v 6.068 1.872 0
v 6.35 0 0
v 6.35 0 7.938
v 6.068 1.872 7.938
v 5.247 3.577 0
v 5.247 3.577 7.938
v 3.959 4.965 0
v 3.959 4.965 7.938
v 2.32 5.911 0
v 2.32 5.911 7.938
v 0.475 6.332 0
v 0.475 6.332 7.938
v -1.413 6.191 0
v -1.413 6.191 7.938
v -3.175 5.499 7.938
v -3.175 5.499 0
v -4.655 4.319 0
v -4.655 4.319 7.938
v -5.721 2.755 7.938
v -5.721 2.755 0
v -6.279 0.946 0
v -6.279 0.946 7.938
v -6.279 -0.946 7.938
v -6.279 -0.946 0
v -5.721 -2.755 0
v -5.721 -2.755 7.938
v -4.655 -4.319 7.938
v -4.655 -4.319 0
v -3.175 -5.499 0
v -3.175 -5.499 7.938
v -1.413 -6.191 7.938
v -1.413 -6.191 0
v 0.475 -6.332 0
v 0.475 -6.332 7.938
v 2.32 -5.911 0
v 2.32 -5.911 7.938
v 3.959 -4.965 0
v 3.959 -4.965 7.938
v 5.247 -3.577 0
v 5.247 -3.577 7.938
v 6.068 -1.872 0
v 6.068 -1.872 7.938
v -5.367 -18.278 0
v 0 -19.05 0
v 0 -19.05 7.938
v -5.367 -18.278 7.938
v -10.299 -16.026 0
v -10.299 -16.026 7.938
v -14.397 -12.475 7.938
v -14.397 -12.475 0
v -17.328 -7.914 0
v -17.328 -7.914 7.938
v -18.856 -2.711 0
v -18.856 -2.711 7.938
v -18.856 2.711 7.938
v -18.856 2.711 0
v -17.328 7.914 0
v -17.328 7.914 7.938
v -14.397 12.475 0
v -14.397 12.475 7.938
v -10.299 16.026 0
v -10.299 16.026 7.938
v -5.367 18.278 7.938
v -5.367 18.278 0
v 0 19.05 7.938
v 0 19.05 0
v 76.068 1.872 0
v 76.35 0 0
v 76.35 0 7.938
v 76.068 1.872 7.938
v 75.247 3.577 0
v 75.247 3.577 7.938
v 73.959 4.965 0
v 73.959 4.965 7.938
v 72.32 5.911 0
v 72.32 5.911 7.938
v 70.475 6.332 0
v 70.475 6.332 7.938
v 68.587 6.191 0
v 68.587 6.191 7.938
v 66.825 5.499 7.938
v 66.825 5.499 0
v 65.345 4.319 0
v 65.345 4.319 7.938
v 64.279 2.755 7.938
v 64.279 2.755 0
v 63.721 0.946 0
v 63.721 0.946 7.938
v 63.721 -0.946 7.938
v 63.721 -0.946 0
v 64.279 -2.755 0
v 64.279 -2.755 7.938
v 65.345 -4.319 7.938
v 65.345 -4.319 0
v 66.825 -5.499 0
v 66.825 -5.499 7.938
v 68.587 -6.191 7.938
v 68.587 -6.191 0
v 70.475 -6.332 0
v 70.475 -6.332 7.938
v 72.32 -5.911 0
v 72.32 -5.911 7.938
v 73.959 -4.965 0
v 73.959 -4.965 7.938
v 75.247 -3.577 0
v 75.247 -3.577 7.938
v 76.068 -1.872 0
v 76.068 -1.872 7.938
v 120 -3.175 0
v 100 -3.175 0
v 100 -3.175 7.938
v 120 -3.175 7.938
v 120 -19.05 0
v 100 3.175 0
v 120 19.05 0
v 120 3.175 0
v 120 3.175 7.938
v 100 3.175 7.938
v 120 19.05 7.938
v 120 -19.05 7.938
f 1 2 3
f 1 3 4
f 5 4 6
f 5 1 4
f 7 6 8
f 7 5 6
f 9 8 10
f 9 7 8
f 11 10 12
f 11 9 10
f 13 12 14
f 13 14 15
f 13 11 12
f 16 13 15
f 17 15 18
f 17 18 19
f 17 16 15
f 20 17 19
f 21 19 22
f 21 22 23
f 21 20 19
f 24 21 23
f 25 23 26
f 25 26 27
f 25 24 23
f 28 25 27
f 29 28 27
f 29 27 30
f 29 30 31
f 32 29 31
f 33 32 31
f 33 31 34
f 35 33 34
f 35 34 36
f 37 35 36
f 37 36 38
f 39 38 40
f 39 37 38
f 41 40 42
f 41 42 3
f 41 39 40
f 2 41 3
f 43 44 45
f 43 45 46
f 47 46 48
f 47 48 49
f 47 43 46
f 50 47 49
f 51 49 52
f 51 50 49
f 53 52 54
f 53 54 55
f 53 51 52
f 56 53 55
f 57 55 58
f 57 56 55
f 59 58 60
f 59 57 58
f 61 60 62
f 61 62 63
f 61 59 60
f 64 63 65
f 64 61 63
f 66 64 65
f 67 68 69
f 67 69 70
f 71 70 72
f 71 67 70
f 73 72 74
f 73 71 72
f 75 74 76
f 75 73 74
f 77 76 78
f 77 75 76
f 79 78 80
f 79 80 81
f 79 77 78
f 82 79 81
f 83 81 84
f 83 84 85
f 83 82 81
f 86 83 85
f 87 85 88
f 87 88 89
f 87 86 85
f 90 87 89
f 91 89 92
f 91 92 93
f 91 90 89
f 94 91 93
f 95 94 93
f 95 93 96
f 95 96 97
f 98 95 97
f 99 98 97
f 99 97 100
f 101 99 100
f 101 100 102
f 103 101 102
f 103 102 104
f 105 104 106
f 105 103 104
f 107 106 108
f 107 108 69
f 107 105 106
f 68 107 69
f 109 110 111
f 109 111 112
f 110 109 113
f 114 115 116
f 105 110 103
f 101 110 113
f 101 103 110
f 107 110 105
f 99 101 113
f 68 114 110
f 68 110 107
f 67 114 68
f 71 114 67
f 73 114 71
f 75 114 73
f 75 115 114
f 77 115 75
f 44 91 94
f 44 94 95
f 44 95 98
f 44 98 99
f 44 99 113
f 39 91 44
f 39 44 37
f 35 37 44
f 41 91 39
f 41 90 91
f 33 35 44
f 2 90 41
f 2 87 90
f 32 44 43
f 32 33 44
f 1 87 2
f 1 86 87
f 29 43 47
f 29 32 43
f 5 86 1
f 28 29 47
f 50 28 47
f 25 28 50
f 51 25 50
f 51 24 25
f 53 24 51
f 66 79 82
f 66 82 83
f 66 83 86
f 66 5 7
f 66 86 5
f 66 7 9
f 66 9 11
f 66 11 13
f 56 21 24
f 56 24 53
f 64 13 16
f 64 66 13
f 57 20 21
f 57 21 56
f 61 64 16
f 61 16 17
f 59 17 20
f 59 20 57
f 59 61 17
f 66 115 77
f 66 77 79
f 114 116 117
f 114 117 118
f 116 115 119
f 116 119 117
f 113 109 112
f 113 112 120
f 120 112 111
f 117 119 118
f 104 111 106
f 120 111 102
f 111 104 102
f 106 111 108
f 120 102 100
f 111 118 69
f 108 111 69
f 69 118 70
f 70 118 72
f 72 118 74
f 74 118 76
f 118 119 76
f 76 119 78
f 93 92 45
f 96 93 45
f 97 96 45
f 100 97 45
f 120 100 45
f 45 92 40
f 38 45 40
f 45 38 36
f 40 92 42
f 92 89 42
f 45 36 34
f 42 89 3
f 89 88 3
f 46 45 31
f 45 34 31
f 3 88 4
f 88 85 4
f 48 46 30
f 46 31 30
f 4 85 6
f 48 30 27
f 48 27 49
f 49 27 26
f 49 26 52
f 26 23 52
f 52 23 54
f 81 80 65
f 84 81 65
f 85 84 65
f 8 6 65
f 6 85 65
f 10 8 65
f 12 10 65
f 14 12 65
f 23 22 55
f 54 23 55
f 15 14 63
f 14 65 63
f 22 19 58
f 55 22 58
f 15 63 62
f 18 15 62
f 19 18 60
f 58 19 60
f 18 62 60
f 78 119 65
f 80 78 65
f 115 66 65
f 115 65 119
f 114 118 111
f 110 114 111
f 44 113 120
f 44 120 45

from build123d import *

# Parameters (mm, degrees)
SKETCH1_R           = 6.35
BOSS_EXTRUDE1_DEPTH = 7.9375


with BuildPart() as part:
    # Sketch1 → Boss-Extrude1 (new body)
    with BuildSketch(Plane.XY):
        with BuildLine():
            Line((0, 19.05), (120, 19.05))
            Line((120, 19.05), (120, 3.175))
            Line((120, 3.175), (100, 3.175))
            Line((100, 3.175), (100, -3.175))
            Line((100, -3.175), (120, -3.175))
            Line((120, -3.175), (120, -19.05))
            Line((120, -19.05), (0, -19.05))
            ThreePointArc((0, -19.05), (-19.05, 0), (0, 19.05))
        make_face()
        Circle(SKETCH1_R, mode=Mode.SUBTRACT)
        with Locations((70, 0)):
            Circle(SKETCH1_R, mode=Mode.SUBTRACT)
    extrude(amount=BOSS_EXTRUDE1_DEPTH)


solid = part.part
